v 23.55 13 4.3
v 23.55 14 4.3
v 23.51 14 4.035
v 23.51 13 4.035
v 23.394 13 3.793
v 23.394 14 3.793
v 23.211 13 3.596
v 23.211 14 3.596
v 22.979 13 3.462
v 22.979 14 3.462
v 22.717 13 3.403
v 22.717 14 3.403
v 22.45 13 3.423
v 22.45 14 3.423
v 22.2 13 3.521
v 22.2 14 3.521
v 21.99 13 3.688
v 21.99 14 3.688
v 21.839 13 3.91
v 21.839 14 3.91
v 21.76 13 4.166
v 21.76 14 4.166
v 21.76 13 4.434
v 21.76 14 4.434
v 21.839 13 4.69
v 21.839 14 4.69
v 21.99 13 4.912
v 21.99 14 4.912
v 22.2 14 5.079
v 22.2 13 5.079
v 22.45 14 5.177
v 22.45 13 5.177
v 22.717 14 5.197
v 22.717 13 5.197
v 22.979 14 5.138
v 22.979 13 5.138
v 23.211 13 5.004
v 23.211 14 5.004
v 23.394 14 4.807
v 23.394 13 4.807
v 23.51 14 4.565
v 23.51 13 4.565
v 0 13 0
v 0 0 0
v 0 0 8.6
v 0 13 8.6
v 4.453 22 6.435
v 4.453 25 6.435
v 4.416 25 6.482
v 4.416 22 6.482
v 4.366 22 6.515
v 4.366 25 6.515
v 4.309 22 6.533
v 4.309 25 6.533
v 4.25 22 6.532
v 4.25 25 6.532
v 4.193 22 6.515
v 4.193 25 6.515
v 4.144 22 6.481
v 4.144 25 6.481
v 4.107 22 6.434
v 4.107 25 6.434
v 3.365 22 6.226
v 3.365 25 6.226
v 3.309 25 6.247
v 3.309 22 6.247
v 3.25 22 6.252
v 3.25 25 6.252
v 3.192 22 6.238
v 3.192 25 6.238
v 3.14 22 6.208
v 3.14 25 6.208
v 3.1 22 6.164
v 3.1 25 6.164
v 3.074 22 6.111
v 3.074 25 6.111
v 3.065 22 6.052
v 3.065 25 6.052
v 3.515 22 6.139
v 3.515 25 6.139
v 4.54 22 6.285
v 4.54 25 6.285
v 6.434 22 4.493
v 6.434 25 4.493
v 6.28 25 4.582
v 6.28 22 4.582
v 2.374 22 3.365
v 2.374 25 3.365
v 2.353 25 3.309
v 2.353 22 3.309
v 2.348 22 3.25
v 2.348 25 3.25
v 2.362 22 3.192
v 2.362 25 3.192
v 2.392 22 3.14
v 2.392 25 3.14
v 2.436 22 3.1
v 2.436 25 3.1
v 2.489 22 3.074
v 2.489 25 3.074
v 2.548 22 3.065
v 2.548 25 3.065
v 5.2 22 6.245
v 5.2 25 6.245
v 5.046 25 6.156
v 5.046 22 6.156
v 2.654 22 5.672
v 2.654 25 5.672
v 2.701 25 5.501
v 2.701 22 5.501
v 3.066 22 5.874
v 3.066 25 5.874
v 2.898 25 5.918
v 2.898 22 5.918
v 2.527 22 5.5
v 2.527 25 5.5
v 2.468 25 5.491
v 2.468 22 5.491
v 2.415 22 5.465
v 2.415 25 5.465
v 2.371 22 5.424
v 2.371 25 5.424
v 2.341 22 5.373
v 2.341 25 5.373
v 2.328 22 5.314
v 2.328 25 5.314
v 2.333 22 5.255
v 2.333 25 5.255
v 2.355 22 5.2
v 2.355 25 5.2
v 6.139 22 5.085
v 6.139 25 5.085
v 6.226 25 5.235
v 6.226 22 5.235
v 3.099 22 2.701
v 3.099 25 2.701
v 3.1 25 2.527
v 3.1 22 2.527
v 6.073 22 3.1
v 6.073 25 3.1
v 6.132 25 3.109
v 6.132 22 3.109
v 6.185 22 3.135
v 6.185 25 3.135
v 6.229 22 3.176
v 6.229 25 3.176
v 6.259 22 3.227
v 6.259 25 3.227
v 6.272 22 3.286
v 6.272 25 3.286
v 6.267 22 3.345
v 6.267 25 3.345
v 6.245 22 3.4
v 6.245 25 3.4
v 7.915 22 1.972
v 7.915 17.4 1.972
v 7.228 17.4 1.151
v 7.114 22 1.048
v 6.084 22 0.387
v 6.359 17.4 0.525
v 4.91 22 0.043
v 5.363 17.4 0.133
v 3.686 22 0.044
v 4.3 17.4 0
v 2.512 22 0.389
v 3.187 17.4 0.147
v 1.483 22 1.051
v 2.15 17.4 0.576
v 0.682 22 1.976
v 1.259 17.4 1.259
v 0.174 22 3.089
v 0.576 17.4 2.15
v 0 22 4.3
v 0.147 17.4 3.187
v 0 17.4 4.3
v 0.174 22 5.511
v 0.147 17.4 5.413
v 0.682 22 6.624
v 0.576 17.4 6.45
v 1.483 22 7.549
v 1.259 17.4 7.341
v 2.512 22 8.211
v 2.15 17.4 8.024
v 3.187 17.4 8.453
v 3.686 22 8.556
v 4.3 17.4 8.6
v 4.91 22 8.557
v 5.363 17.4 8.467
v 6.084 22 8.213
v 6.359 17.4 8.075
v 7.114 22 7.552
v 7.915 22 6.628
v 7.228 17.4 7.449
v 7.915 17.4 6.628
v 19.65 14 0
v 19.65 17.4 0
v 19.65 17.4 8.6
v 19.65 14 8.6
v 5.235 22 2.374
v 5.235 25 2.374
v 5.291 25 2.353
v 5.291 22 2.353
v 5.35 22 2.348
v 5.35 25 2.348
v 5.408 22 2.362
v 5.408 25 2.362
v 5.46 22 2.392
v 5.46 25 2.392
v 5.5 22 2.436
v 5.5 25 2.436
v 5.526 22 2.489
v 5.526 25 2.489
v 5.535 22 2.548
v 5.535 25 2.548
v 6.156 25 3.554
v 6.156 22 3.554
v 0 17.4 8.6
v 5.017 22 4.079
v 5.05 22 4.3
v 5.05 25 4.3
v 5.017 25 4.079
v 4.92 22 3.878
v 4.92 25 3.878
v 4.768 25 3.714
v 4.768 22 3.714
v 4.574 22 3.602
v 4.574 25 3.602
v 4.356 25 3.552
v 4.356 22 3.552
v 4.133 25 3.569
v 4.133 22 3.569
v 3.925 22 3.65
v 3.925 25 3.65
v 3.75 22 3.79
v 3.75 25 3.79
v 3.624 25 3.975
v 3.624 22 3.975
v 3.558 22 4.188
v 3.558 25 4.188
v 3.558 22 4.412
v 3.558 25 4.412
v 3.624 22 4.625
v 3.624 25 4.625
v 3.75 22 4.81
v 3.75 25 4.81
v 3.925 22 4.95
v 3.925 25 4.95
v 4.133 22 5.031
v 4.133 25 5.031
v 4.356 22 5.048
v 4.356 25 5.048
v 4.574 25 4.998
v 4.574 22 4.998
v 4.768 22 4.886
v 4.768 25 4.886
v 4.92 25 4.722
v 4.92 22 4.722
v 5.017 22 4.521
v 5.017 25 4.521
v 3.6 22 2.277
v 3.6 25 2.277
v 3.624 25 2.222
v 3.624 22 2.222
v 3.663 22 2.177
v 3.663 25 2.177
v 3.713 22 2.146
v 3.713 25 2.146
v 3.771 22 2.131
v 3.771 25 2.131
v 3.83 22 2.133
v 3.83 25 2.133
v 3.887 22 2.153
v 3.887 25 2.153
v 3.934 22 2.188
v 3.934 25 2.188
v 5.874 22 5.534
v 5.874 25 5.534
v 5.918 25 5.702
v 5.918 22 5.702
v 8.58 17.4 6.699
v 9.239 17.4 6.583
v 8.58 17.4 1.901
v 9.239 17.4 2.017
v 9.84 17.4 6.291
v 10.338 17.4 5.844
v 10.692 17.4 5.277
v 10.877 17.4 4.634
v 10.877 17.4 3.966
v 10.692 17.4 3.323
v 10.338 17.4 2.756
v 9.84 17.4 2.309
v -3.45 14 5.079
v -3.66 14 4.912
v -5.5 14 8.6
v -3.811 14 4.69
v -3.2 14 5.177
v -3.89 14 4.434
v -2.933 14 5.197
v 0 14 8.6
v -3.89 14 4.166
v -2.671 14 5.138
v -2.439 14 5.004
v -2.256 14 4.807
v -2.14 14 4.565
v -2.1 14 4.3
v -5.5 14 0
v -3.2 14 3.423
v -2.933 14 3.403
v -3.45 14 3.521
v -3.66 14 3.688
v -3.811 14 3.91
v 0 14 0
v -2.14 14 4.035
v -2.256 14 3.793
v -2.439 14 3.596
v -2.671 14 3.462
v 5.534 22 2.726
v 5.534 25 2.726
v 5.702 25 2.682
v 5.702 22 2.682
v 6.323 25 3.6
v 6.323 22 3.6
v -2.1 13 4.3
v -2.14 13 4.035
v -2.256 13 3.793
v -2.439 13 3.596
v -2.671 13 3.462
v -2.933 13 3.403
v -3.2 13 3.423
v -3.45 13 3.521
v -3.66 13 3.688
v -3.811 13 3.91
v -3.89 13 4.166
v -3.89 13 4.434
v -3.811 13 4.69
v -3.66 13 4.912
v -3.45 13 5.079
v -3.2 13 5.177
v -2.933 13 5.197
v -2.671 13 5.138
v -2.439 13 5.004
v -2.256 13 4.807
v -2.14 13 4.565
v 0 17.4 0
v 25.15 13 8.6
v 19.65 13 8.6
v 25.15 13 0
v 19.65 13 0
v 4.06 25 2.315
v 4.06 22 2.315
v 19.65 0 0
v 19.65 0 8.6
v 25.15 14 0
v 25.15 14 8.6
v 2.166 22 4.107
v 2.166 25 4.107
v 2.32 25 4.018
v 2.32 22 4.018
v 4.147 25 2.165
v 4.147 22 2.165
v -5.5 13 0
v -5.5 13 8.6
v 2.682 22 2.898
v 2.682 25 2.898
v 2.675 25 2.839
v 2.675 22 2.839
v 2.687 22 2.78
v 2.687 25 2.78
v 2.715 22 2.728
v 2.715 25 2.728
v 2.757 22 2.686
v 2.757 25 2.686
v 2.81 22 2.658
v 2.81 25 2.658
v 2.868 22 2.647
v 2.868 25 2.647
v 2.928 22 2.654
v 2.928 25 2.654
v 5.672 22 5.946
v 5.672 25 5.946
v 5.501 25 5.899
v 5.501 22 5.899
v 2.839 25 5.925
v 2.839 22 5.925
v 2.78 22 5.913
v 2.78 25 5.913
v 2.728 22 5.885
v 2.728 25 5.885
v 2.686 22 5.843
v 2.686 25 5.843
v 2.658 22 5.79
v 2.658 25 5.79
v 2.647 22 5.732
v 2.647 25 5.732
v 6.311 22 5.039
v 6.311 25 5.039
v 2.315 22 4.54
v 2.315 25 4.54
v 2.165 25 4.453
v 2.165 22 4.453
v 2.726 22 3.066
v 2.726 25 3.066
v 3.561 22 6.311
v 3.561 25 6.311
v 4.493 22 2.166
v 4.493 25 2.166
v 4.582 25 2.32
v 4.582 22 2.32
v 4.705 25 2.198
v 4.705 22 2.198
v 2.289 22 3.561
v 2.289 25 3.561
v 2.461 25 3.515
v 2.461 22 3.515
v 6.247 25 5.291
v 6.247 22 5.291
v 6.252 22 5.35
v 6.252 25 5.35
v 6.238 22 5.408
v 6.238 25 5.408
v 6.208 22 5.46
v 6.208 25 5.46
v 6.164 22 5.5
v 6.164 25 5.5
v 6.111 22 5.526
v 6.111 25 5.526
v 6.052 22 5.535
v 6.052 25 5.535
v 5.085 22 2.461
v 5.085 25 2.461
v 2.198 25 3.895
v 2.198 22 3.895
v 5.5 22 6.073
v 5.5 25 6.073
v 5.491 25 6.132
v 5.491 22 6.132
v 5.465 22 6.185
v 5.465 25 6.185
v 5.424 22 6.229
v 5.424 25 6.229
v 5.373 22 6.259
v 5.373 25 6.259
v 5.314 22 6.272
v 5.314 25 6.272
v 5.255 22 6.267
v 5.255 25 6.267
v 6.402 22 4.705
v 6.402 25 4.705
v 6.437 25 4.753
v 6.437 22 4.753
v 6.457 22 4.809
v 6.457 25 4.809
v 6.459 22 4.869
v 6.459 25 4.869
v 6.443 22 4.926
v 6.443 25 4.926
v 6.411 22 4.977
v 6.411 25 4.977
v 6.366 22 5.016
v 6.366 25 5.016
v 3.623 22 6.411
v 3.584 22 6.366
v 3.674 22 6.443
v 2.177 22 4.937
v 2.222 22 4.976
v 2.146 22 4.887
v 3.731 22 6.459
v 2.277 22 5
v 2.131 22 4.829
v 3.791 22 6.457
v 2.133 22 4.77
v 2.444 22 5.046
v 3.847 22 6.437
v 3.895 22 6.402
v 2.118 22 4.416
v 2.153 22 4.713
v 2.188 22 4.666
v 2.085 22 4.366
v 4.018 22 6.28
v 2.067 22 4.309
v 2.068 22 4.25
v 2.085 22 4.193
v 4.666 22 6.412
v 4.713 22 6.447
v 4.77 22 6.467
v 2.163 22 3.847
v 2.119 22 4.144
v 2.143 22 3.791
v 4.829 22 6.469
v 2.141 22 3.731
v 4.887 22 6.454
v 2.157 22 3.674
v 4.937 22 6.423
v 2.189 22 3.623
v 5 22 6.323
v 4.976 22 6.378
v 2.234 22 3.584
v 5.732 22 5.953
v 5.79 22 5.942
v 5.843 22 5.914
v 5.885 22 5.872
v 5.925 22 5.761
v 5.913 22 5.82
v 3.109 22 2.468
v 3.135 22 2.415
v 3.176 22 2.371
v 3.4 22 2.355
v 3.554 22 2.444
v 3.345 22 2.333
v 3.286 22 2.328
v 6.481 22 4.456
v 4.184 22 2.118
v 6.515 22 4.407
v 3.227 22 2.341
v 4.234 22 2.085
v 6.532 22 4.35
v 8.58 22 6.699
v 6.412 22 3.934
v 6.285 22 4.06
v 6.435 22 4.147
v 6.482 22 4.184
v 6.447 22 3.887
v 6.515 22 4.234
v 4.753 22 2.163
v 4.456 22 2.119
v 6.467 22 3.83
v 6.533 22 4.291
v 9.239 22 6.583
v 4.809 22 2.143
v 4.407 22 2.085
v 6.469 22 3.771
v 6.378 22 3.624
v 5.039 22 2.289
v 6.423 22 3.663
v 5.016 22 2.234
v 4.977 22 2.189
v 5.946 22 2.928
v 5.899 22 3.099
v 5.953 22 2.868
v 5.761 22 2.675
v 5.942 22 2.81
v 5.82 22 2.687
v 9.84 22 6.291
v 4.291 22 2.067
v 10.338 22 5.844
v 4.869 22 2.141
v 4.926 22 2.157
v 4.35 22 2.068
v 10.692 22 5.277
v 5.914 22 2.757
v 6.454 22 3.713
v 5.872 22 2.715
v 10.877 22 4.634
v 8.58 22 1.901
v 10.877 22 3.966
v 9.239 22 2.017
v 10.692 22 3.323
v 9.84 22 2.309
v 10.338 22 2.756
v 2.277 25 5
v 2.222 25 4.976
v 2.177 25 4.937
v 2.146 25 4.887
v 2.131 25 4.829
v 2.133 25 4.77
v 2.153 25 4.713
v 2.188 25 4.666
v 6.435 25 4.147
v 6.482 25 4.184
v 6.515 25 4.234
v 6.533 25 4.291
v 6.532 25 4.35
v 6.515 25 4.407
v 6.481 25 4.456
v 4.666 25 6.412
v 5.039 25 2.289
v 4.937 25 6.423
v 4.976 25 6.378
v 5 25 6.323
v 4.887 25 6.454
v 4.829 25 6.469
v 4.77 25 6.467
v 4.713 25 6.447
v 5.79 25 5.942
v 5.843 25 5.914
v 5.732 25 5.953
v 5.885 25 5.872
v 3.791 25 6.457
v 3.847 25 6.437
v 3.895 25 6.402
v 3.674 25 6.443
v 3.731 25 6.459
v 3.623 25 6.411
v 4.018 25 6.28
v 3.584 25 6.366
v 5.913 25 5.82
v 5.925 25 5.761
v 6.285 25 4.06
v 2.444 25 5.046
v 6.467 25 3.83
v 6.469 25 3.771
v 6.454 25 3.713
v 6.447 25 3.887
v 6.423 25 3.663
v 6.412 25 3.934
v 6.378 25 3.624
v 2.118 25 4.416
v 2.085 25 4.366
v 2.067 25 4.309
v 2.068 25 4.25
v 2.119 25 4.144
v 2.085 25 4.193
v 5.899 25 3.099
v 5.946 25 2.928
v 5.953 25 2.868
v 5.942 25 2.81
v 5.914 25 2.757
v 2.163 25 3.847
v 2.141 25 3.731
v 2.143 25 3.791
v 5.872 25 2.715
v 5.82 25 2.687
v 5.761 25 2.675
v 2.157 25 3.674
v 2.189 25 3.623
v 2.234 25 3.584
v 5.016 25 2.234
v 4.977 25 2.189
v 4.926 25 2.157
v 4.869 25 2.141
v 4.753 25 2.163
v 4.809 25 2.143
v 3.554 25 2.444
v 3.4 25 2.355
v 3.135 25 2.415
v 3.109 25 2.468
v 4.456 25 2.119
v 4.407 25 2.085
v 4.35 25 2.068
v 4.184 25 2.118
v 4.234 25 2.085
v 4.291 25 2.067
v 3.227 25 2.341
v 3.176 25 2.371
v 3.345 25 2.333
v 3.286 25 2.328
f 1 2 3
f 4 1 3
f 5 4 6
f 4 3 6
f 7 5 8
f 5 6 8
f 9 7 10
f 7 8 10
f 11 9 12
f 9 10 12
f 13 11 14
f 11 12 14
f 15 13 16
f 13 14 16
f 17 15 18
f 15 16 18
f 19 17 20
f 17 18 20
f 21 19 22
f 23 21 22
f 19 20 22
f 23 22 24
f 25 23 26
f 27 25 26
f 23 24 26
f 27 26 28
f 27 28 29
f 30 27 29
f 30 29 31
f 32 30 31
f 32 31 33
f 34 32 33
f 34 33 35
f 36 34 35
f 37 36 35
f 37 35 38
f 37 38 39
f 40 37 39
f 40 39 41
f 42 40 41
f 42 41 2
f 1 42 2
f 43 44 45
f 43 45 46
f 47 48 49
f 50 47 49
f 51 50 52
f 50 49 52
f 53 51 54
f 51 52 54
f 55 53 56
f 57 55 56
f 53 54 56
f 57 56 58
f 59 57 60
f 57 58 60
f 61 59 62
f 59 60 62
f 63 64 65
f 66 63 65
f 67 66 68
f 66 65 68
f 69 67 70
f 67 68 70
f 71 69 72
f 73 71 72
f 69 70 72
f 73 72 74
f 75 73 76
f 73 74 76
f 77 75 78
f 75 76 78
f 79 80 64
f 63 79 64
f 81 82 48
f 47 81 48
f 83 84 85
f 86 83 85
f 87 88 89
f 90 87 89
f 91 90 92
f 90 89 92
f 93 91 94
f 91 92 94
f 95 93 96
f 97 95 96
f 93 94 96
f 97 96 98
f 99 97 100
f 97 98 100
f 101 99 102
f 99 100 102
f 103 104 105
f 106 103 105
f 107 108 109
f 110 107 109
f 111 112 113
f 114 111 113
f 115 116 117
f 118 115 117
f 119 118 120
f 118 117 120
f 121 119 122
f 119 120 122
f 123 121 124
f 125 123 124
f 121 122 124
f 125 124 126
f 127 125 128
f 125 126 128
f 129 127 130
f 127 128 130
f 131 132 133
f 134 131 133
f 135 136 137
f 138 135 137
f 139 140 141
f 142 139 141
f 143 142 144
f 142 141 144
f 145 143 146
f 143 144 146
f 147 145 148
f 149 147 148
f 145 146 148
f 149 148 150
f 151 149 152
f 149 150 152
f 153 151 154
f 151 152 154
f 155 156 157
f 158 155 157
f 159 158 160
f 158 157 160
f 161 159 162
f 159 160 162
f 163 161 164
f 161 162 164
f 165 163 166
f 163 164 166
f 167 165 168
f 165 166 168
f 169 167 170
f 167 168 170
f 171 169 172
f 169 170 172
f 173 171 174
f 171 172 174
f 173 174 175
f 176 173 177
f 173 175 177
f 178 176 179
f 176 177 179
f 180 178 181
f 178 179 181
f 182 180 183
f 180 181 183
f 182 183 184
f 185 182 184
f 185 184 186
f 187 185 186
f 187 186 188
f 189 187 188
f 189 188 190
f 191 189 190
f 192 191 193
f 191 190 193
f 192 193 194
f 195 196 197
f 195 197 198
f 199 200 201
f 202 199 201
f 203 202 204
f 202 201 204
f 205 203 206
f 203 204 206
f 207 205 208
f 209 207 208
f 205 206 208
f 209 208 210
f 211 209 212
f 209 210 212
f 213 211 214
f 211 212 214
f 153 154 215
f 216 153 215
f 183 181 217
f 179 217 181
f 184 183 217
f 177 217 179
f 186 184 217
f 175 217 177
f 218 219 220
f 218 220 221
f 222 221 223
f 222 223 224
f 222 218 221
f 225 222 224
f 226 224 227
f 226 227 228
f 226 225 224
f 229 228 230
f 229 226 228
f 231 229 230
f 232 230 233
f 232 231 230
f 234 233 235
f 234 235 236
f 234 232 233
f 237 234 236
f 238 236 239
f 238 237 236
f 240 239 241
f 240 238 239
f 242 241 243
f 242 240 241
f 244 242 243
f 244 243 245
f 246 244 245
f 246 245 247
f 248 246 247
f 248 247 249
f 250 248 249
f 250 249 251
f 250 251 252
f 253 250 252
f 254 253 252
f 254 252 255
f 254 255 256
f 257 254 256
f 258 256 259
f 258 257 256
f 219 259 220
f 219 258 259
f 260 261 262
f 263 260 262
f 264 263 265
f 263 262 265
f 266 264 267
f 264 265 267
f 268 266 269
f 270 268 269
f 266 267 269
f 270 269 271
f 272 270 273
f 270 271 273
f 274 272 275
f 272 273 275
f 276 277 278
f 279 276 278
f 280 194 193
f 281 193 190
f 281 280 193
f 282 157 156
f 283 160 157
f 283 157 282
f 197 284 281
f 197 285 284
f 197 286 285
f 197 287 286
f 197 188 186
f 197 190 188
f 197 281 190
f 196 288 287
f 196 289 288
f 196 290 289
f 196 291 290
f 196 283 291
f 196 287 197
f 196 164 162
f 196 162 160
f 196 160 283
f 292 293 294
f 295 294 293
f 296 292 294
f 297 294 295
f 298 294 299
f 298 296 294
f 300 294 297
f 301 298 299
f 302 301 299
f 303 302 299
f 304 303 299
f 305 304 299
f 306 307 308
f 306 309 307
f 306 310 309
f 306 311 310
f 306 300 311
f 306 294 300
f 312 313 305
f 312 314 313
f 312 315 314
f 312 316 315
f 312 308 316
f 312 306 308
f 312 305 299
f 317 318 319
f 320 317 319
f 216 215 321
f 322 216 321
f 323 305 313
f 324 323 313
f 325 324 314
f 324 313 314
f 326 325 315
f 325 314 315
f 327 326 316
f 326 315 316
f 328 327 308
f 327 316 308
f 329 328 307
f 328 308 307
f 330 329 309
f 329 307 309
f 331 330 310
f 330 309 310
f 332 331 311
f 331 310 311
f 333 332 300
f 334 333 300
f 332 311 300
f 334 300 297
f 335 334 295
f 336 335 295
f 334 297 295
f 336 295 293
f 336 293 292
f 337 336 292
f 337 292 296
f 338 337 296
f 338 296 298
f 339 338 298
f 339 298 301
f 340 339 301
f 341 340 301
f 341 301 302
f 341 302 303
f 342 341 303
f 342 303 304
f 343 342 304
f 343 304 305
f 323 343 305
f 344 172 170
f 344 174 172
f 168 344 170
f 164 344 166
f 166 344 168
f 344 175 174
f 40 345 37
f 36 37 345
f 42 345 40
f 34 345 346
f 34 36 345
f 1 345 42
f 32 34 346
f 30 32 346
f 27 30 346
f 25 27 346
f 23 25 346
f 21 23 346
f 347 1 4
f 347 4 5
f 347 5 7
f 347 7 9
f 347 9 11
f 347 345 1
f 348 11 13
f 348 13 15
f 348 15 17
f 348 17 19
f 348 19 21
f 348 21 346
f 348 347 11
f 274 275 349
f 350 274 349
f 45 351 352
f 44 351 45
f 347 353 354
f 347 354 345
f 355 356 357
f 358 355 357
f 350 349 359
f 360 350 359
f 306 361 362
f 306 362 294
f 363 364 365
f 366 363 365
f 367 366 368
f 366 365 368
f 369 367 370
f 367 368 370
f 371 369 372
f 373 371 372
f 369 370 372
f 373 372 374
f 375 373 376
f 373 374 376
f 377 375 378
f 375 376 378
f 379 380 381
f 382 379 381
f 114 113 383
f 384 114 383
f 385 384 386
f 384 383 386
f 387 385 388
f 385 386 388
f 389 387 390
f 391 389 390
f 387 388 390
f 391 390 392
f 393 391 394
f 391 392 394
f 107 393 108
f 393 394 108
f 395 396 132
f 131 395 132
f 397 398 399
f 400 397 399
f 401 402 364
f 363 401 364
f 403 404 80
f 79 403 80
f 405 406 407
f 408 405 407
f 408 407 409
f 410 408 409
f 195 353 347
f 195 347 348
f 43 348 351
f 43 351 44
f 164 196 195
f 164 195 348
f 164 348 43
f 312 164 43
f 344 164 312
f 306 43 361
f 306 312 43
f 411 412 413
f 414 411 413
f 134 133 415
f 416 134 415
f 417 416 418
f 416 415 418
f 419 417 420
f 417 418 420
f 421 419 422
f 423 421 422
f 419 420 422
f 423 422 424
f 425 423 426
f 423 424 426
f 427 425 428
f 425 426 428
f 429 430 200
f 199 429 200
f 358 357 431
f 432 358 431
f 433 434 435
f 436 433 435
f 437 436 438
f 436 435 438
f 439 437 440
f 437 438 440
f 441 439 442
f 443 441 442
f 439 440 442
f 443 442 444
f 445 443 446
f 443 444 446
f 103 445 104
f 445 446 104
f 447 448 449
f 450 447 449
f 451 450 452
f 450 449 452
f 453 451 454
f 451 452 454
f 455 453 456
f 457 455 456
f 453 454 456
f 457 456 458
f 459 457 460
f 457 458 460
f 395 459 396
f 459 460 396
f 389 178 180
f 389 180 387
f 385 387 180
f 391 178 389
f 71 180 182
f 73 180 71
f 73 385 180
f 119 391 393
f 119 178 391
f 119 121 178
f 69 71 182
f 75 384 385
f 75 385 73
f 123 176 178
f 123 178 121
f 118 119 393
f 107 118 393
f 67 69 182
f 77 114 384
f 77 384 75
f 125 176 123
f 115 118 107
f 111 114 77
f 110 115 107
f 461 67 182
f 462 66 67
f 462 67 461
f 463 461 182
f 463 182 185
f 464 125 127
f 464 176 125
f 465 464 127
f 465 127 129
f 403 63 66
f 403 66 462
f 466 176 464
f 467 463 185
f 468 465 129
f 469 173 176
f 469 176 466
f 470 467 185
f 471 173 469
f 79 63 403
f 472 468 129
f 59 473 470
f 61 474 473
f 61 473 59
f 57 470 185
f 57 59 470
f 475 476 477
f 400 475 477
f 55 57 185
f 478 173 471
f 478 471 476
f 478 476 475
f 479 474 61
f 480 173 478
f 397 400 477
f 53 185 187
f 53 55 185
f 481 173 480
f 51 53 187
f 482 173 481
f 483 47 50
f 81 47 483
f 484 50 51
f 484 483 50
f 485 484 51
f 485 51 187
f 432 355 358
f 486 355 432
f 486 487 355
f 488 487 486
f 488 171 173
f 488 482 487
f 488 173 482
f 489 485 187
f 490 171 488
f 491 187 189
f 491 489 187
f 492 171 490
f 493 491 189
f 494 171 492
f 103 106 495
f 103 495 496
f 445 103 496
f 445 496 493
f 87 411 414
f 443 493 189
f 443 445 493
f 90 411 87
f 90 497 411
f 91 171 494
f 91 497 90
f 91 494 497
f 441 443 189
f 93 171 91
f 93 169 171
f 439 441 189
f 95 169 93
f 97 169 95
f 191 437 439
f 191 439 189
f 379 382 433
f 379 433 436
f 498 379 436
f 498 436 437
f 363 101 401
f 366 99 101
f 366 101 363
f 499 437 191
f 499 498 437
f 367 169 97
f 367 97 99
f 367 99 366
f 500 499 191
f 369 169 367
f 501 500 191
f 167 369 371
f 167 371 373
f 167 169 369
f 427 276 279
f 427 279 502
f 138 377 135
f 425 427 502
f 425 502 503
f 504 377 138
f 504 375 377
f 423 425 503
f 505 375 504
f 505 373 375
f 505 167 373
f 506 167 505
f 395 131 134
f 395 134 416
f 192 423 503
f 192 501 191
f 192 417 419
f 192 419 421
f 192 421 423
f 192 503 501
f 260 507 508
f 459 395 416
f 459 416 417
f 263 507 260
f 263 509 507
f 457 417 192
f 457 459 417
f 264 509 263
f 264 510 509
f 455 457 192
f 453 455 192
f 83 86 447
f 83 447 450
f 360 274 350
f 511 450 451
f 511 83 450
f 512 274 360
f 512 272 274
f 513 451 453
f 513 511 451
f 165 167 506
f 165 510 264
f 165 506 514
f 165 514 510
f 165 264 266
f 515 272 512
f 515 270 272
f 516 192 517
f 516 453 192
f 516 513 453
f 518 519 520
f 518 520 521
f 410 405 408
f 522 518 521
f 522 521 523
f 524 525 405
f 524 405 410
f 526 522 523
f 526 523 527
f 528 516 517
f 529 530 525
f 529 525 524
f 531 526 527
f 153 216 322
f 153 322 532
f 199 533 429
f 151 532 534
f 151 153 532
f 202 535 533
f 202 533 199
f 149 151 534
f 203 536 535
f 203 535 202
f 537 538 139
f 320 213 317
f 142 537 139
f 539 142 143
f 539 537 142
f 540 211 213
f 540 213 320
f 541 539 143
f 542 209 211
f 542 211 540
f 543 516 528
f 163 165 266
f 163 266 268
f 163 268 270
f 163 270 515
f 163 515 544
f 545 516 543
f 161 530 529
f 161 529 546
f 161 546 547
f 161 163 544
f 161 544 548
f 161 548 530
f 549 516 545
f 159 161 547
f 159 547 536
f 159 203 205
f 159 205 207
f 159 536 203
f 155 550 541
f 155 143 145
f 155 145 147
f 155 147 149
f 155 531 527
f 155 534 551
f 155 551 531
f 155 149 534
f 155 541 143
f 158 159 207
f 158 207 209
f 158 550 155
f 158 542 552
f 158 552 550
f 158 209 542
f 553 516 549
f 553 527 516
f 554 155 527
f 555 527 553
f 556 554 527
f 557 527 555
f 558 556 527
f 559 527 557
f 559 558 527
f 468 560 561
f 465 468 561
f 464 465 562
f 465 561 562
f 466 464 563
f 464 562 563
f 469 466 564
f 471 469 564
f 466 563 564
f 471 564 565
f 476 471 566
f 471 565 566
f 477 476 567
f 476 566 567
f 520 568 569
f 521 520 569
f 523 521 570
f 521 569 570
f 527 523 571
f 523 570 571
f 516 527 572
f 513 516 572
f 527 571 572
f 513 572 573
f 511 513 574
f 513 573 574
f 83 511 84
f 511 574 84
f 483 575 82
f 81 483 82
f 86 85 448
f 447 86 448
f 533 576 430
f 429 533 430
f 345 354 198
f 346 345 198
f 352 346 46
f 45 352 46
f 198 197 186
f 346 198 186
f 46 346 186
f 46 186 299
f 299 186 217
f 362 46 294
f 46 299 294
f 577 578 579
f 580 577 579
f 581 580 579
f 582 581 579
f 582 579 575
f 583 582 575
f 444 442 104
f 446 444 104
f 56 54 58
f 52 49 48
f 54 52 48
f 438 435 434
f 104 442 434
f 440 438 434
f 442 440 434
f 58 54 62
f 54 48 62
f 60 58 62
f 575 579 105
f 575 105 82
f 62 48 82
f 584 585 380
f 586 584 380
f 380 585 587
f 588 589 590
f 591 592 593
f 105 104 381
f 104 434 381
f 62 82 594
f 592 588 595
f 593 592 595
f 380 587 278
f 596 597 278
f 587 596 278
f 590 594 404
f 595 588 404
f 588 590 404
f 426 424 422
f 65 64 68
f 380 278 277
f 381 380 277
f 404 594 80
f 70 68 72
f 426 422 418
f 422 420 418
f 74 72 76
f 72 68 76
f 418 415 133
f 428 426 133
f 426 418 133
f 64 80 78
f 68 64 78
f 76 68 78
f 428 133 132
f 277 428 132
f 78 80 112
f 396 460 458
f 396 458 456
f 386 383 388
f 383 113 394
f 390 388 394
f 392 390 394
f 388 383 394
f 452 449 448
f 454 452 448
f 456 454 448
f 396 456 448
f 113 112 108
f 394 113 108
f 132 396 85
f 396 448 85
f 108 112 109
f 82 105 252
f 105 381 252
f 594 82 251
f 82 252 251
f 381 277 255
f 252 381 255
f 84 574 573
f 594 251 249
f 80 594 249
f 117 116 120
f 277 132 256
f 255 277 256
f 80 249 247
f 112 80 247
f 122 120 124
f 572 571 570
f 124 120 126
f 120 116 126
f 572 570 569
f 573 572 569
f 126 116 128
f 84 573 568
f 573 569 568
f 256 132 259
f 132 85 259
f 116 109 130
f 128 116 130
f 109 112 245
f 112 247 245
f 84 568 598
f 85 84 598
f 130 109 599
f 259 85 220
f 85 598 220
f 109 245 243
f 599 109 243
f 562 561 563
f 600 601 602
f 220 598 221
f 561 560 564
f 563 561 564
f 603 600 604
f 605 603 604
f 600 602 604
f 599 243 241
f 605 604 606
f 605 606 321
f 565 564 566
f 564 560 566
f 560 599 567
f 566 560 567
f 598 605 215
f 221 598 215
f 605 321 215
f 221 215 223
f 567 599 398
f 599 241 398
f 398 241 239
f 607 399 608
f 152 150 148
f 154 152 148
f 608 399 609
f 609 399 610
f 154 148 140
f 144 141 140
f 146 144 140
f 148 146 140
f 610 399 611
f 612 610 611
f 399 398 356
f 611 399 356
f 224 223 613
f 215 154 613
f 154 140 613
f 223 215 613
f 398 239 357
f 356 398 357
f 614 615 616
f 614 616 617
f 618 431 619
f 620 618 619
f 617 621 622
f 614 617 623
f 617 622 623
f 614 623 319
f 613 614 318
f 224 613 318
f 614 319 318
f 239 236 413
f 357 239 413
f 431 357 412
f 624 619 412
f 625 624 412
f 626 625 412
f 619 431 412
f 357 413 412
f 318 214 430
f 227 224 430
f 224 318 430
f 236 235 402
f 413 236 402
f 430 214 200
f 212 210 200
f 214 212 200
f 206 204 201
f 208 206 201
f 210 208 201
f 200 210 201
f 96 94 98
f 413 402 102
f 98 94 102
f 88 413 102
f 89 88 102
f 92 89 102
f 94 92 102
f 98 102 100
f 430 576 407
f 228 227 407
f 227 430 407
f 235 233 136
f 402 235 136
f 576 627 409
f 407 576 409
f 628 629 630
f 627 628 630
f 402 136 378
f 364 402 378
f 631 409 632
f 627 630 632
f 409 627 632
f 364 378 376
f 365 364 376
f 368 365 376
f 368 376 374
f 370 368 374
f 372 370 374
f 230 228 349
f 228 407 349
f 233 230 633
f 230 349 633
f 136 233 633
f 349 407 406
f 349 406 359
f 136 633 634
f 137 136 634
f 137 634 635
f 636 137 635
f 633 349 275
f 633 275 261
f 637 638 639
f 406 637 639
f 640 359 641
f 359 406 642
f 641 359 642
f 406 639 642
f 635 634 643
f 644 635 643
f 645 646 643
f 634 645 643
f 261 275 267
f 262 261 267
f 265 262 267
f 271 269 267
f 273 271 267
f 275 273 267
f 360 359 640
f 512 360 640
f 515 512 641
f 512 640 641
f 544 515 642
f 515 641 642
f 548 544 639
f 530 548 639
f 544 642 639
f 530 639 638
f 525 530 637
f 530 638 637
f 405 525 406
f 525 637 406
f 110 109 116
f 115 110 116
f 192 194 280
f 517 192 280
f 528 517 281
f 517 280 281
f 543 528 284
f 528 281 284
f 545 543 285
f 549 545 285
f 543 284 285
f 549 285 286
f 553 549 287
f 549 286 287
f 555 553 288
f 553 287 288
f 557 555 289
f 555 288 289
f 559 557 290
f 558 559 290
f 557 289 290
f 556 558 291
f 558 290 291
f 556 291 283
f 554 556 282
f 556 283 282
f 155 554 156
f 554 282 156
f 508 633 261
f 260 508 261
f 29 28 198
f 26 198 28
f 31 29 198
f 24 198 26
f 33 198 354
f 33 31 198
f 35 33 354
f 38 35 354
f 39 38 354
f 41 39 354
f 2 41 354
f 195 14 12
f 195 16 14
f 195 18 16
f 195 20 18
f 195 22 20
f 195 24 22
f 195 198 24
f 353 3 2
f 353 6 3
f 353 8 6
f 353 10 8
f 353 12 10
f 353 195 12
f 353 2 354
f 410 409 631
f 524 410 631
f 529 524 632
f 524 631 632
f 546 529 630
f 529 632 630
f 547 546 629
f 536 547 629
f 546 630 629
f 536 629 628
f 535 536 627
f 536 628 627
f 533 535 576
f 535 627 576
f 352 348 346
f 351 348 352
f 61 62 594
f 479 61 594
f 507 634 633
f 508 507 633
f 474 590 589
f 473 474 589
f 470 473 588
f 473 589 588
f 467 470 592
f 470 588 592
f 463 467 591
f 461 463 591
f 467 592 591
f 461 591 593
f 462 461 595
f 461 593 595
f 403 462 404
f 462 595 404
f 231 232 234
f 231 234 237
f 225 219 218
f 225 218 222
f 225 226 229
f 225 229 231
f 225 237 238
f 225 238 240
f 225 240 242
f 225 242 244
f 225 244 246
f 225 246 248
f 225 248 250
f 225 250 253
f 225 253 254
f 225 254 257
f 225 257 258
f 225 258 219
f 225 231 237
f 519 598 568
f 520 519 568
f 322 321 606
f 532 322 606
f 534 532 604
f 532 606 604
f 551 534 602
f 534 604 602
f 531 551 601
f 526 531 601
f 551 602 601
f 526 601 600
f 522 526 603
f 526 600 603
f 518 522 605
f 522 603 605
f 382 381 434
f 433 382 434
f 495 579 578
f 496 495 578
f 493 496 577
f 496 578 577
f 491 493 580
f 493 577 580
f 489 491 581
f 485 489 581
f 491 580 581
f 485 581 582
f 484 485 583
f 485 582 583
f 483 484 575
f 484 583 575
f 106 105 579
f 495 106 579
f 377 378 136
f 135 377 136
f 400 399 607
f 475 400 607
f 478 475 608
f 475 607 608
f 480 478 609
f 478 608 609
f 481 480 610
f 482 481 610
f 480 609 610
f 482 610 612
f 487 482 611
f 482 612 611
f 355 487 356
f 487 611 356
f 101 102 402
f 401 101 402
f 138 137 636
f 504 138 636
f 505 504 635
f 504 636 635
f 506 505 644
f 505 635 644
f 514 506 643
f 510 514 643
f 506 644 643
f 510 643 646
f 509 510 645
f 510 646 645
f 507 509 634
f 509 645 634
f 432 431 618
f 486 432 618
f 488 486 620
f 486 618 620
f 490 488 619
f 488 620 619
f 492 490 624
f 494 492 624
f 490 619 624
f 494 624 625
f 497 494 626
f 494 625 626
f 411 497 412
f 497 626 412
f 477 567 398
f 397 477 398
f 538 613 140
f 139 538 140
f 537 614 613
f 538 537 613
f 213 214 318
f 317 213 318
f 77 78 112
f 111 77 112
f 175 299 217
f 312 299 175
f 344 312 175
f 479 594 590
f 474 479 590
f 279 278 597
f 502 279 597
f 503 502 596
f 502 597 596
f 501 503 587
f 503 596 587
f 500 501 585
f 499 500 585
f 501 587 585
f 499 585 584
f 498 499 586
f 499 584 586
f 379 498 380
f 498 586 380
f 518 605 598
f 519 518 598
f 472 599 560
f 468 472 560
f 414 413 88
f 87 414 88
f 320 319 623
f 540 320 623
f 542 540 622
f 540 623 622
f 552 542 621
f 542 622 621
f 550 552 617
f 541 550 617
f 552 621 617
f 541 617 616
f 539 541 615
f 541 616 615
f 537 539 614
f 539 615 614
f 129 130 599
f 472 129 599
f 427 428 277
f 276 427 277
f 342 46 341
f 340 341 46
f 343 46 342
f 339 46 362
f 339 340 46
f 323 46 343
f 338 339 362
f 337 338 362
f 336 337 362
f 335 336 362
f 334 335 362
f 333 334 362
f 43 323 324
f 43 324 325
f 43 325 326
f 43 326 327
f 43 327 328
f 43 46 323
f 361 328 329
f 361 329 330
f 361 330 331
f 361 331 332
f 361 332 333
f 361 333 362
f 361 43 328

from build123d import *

# Parameters (mm, degrees)
RESSALTO_EXTRUS_O1_DEPTH = 8.6
ESBO_O2_R                = 0.9
CORTE_EXTRUS_O1_DEPTH    = 15
ESBO_O3_R                = 4.3
ESBO_O3_R_2              = 2.4
RESSALTO_EXTRUS_O3_DEPTH = 4.6
ESBO_O4_R                = 1.9
ESBO_O4_R_2              = 0.75
RESSALTO_EXTRUS_O4_DEPTH = 3
RESSALTO_EXTRUS_O5_DEPTH = 3
PADR_OCIRCULAR1_COUNT    = 24


with BuildPart() as part:
    # Esboço1 → Ressalto-extrusão1 (new body)
    with BuildSketch(Plane.XY):
        Polygon((0, 0), (0, 13), (-5.5, 13), (-5.5, 14), (0, 14), (0, 17.4), (19.65, 17.4), (19.65, 14), (25.15, 14), (25.15, 13), (19.65, 13), (19.65, 0), align=None)
    extrude(amount=RESSALTO_EXTRUS_O1_DEPTH)

    # Esboço2 → Corte-extrusão1 (cut, through all)
    with BuildSketch(Plane(origin=(0, 14, 0), x_dir=(1, 0, 0), z_dir=(0, 1, 0))):
        with Locations((-3, -4.3)):
            Circle(ESBO_O2_R)
        with Locations((22.65, -4.3)):
            Circle(ESBO_O2_R)
    extrude(amount=-CORTE_EXTRUS_O1_DEPTH, mode=Mode.SUBTRACT)

    # Esboço3 → Ressalto-extrusão3 (add)
    with BuildSketch(Plane(origin=(0, 17.4, 0), x_dir=(1, 0, 0), z_dir=(0, 1, 0))):
        with Locations((4.3, -4.3)):
            Circle(ESBO_O3_R)
        with Locations((8.5, -4.3)):
            Circle(ESBO_O3_R_2)
    extrude(amount=RESSALTO_EXTRUS_O3_DEPTH)

    # Esboço4 → Ressalto-extrusão4 (add)
    with BuildSketch(Plane(origin=(0, 22, 0), x_dir=(1, 0, 0), z_dir=(0, 1, 0))):
        with Locations((4.3, -4.3)):
            Circle(ESBO_O4_R)
        with Locations((4.3, -4.3)):
            Circle(ESBO_O4_R_2, mode=Mode.SUBTRACT)
    extrude(amount=RESSALTO_EXTRUS_O4_DEPTH)

    # Esboço5 → Ressalto-extrusão5 (add)
    with BuildSketch(Plane(origin=(0, 25, 0), x_dir=(1, 0, 0), z_dir=(0, 1, 0))):
        with BuildLine():
            Line((3.996143779, -2.424454374), (4.147072388, -2.164733177))
            ThreePointArc((4.147072388, -2.164733177), (4.320558883, -2.065222191), (4.493481171, -2.16571041))
            Line((4.493481171, -2.16571041), (4.646102398, -2.431788789))
            Line((4.646102398, -2.431788789), (3.996143779, -2.424454374))
        make_face()
    ressalto_extrus_o5 = extrude(amount=-RESSALTO_EXTRUS_O5_DEPTH)

    # PadrãoCircular1: Ressalto-extrusão5 ×24 about axis
    padr_ocircular1_axis = Axis((4.3, 0, 4.3), (0, 1, 0))
    for i in range(1, PADR_OCIRCULAR1_COUNT):
        add(ressalto_extrus_o5.rotate(padr_ocircular1_axis, i * 360 / PADR_OCIRCULAR1_COUNT))


solid = part.part
